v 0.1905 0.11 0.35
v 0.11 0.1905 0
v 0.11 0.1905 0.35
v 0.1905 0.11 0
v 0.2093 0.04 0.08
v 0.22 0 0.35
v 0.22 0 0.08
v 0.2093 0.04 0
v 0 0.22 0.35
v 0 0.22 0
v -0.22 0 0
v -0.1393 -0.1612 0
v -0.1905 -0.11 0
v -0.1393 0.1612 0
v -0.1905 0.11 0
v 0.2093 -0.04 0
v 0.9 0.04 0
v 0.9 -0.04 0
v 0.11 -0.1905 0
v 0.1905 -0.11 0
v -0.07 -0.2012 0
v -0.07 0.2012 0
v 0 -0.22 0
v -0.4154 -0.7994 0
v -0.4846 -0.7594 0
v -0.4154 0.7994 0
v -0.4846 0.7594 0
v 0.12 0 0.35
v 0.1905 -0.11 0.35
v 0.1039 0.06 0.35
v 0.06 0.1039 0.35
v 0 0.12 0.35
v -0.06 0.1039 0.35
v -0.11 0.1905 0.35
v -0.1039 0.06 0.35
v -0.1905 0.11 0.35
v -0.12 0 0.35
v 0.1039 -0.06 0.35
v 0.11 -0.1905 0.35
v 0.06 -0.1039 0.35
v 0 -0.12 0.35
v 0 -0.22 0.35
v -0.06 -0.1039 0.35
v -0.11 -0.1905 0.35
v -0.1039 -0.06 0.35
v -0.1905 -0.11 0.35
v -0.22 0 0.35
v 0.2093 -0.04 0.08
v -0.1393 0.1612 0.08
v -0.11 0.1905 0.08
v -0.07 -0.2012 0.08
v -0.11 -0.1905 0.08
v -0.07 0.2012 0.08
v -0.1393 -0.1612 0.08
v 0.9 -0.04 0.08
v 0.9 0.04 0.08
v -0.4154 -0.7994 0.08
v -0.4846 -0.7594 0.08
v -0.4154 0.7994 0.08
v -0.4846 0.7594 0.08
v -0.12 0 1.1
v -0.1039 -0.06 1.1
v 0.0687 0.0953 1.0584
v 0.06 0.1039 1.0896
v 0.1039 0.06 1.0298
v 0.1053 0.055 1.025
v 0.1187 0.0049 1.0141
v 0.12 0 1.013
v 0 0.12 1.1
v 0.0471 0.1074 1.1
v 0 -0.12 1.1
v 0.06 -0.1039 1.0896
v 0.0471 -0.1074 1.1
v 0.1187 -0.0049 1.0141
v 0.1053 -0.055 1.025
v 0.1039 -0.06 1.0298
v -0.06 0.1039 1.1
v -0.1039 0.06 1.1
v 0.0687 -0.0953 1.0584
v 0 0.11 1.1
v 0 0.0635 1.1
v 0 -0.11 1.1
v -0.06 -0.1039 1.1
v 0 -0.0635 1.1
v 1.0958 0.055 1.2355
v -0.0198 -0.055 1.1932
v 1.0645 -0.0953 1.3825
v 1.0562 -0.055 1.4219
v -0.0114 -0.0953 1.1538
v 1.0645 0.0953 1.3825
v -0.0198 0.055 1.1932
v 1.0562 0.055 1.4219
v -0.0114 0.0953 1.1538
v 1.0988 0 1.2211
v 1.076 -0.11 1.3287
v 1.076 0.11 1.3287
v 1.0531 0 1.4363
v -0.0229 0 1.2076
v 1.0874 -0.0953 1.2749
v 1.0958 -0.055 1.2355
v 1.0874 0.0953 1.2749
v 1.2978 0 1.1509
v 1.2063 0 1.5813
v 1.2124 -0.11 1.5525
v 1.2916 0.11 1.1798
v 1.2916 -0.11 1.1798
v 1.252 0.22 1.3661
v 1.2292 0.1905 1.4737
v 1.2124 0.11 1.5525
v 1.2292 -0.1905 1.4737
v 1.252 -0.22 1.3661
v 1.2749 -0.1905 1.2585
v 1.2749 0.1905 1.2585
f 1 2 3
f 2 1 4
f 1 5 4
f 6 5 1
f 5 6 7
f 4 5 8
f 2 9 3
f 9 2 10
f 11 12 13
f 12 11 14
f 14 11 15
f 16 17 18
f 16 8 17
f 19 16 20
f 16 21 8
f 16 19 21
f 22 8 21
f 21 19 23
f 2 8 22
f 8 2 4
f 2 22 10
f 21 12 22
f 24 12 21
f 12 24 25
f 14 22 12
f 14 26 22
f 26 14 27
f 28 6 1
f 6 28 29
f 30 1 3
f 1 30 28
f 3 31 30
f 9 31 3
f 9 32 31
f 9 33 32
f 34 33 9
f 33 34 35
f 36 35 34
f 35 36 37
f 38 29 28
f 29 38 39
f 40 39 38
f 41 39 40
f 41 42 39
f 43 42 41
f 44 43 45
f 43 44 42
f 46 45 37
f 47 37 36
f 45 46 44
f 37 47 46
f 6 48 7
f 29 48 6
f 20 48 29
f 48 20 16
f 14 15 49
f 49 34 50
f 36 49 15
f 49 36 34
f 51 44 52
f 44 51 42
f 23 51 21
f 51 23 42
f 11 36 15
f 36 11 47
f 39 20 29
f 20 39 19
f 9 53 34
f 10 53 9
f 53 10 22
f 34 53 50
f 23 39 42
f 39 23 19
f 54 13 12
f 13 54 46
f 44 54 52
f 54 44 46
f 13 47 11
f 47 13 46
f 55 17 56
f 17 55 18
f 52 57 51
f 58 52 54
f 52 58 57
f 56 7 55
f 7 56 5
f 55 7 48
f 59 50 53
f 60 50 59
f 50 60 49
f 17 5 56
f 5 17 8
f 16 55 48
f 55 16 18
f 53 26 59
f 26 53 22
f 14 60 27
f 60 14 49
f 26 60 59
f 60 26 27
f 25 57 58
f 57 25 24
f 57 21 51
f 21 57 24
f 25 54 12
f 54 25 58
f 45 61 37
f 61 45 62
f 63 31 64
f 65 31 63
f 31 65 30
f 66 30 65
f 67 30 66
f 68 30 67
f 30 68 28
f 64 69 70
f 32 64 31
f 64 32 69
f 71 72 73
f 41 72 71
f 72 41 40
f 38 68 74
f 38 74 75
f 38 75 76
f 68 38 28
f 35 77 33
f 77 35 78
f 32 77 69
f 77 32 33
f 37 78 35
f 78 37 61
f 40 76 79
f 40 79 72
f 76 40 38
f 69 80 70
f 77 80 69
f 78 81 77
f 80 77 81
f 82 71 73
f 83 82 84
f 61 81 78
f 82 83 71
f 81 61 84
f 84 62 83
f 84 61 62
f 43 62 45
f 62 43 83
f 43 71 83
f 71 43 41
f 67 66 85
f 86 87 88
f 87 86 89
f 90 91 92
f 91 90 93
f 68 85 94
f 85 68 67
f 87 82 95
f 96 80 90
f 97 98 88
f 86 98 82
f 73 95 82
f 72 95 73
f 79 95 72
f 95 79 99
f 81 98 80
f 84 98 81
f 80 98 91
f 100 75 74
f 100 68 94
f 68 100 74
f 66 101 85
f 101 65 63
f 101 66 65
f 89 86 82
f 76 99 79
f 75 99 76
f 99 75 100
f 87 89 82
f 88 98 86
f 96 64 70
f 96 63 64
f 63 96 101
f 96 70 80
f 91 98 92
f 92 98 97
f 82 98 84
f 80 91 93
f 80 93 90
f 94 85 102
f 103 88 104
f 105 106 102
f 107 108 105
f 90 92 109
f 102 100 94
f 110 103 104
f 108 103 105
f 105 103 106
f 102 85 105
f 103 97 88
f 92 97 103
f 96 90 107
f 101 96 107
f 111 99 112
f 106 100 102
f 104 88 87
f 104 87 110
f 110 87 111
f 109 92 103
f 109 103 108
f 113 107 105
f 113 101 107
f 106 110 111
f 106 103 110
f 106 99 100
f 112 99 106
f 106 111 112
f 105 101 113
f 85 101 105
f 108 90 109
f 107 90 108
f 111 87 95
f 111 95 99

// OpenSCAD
// Snow gun — industrial snowmaking cannon on a tripod mount.
//
// A narrow tripod base spreads three legs outward around a central hub.
// A vertical swivel post rises from the hub, and a horizontal cannon
// barrel points along +X (the direction the nozzle faces). The game
// spreads snow in a uniform circle regardless of barrel orientation, but
// the directional silhouette reads clearly at resort scale.
//
// Real snow guns are 0.5–1 m in diameter and 1–2 m long; this model
// is sized to be visible at the same zoom level as a patrol hut without
// dominating the terrain.
//
// Conventions, units, and axis docs: see models-src/README.md.

$fn = 12;

// ── Dimensions (metres) ────────────────────────────────────────────────
// Tripod
leg_len    = 0.9;  // leg length from hub centre
leg_w      = 0.08; // leg cross-section (square)
hub_r      = 0.22; // hub cylinder radius
hub_h      = 0.35; // hub cylinder height

// Swivel post
post_r     = 0.12;
post_h     = 0.75;

// Cannon barrel (horizontal, angled slightly up)
barrel_r   = 0.11;
barrel_len = 1.1;
barrel_tilt = 12;  // degrees above horizontal

// Nozzle shroud (cone at the barrel tip)
nozzle_r   = 0.22; // outer radius at the open end
nozzle_h   = 0.18;

// ── Geometry ───────────────────────────────────────────────────────────

// Hub cylinder sitting on the ground.
module hub() {
    color("DimGray")
        cylinder(r = hub_r, h = hub_h, center = false);
}

// One tripod leg — a thin rectangular prism angled outward in the XY plane.
// `angle` rotates the leg around Z so three legs splay 120° apart.
module leg(angle) {
    color("DimGray")
        rotate([0, 0, angle])
            translate([leg_len / 2, 0, leg_w / 2])
                cube([leg_len, leg_w, leg_w], center = true);
}

module tripod() {
    hub();
    leg(0);
    leg(120);
    leg(240);
}

// Swivel post rising from the top of the hub.
module post() {
    color("DimGray")
        translate([0, 0, hub_h])
            cylinder(r = post_r, h = post_h, center = false);
}

// Cannon barrel: horizontal cylinder on the swivel post, angled `barrel_tilt`
// degrees above horizontal and pointing along +X.
module barrel() {
    base_z = hub_h + post_h;
    color("SlateGray")
        translate([0, 0, base_z])
            rotate([0, -barrel_tilt, 0])
                translate([barrel_len / 2, 0, 0])
                    rotate([0, 90, 0])
                        cylinder(r = barrel_r, h = barrel_len, center = true);
}

// Nozzle shroud — a cone at the +X tip of the barrel suggesting the fan-spray outlet.
module nozzle() {
    base_z  = hub_h + post_h;
    tip_x   = barrel_len * cos(barrel_tilt);
    tip_z   = barrel_len * sin(barrel_tilt);
    color("SlateGray")
        translate([tip_x, 0, base_z + tip_z])
            rotate([0, -barrel_tilt, 0])
                rotate([0, 90, 0])
                    cylinder(r1 = barrel_r, r2 = nozzle_r, h = nozzle_h, center = false);
}

tripod();
post();
barrel();
nozzle();
